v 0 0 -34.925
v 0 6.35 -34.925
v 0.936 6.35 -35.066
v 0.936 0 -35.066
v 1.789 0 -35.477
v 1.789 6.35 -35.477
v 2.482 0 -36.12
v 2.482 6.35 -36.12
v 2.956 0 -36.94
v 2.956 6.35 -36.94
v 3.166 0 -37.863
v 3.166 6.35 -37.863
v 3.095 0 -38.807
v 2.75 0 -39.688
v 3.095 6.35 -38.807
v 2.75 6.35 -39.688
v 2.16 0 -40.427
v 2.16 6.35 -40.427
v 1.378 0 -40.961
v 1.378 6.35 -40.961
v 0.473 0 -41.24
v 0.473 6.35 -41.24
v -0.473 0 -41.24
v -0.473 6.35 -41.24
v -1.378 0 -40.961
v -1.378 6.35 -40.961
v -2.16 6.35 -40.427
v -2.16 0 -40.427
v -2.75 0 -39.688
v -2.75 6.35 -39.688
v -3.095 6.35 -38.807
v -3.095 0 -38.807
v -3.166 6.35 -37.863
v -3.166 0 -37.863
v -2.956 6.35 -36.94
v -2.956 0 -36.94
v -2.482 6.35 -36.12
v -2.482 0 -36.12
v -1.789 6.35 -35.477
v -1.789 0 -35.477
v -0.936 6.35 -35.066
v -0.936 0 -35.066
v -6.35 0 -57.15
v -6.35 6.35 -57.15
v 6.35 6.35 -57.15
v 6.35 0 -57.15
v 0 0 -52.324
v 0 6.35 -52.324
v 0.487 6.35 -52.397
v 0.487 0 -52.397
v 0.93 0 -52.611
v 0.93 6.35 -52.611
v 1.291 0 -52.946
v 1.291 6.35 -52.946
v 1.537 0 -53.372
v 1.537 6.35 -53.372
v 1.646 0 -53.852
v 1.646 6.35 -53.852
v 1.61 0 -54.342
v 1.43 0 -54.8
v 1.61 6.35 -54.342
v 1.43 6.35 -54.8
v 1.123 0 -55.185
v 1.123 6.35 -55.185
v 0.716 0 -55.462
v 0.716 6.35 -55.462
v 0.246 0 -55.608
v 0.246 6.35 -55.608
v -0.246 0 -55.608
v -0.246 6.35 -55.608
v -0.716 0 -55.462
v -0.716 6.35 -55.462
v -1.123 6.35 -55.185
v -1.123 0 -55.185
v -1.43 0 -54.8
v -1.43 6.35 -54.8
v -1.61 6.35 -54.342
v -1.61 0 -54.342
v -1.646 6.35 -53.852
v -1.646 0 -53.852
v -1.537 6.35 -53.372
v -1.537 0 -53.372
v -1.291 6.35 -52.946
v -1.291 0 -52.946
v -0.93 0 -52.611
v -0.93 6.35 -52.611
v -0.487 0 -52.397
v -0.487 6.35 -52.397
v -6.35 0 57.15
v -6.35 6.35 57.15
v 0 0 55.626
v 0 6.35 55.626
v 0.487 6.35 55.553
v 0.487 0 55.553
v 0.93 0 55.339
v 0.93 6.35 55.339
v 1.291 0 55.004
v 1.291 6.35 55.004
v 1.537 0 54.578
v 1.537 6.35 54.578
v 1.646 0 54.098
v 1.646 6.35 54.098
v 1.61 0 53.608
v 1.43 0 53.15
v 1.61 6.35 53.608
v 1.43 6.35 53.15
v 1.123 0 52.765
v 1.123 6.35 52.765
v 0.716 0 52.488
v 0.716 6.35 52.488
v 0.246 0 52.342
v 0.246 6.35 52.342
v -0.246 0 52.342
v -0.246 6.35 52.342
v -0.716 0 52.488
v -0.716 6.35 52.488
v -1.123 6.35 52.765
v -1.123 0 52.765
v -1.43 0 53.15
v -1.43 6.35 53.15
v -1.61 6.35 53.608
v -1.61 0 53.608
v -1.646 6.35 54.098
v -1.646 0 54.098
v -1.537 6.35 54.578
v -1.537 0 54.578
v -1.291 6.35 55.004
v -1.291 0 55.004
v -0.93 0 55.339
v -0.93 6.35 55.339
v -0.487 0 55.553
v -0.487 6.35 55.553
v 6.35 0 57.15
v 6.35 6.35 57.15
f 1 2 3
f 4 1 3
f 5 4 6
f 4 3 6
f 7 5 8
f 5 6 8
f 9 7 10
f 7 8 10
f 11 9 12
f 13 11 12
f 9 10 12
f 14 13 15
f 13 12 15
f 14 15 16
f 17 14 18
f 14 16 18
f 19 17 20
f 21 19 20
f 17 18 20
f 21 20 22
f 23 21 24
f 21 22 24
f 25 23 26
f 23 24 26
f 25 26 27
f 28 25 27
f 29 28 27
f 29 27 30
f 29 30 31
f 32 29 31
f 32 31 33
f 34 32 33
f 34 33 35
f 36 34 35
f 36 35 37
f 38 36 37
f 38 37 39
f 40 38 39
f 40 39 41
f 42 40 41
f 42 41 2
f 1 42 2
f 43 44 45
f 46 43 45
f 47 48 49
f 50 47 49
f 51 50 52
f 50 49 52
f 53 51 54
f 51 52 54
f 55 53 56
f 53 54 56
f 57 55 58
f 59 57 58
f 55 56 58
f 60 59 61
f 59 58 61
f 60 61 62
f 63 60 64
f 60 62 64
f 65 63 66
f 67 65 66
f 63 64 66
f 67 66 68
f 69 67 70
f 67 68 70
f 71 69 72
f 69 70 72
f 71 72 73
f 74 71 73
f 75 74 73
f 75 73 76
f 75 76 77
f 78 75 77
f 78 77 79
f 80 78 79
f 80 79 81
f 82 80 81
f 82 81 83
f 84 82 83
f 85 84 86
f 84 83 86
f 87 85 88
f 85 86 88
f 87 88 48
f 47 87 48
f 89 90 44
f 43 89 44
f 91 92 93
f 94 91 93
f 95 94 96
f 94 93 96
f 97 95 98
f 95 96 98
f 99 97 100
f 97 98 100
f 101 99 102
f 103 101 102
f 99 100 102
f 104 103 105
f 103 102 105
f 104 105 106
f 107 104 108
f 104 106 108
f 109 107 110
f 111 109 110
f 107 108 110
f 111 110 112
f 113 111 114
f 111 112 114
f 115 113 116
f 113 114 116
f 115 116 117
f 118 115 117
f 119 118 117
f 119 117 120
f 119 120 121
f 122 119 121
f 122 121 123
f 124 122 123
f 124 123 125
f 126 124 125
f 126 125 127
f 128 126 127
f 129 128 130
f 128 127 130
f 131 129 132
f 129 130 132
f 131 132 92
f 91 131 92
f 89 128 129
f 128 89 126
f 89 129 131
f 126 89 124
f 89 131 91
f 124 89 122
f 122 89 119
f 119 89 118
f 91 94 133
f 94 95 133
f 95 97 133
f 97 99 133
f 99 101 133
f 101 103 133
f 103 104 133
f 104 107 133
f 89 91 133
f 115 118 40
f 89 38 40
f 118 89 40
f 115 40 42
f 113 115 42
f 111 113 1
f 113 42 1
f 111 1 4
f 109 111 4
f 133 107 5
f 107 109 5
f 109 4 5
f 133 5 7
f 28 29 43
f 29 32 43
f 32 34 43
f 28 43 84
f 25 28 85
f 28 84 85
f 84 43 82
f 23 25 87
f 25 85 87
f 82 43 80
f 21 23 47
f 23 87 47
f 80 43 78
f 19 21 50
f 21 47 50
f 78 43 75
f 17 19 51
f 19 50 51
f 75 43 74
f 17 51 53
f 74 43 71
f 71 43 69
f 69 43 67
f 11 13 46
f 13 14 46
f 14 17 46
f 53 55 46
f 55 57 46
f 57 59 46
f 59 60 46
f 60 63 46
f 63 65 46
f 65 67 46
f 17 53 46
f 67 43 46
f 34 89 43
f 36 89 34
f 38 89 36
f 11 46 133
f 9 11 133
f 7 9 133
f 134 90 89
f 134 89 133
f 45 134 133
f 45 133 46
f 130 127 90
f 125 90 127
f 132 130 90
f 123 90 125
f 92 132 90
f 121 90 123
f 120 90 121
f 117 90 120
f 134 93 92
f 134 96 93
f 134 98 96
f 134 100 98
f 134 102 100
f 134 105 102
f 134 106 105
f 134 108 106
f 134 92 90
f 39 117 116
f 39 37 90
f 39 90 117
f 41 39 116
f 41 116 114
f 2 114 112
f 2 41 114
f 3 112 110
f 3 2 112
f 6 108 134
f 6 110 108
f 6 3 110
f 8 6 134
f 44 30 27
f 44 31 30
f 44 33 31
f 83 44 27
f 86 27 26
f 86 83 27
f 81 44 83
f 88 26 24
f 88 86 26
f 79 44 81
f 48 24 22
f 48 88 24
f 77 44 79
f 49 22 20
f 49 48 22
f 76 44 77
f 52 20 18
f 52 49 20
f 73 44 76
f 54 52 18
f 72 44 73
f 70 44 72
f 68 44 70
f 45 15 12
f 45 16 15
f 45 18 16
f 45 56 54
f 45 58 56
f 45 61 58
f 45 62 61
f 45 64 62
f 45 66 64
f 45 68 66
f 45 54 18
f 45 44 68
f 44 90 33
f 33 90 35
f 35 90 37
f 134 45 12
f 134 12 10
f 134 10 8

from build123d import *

# Parameters (mm, degrees)
SKETCH1_W           = 12.7
SKETCH1_H           = 101.6
BOSS_EXTRUDE1_DEPTH = 6.35
SKETCH2_W           = 12.7
SKETCH2_H           = 6.35
SKETCH2_R           = 1.651
BOSS_EXTRUDE2_DEPTH = 6.35
SKETCH3_R           = 3.175
CUT_EXTRUDE1_DEPTH  = 58.851253228


with BuildPart() as part:
    # Sketch1 → Boss-Extrude1 (new body)
    with BuildSketch(Plane(origin=(0, 0, 0), x_dir=(1, 0, 0), z_dir=(0, 1, 0))):
        Rectangle(SKETCH1_W, SKETCH1_H)
    extrude(amount=BOSS_EXTRUDE1_DEPTH)

    # Sketch2 → Boss-Extrude2 (add)
    # profile 1 of 2: a face of its own
    with BuildSketch(Plane(origin=(0, 6.35, 0), x_dir=(1, 0, 0), z_dir=(0, 1, 0))):
        with Locations((0, 53.975)):
            Rectangle(SKETCH2_W, SKETCH2_H)
        with Locations(Location((0, 53.975, 0), (0, 0, 270))):
            Circle(SKETCH2_R, mode=Mode.SUBTRACT)
    # profile 2 of 2: a face of its own
    with BuildSketch(Plane(origin=(0, 6.35, 0), x_dir=(1, 0, 0), z_dir=(0, 1, 0))):
        with Locations((0, -53.975)):
            Rectangle(SKETCH2_W, SKETCH2_H)
        with Locations(Location((0, -53.975, 0), (0, 0, 270))):
            Circle(SKETCH2_R, mode=Mode.SUBTRACT)
    extrude(amount=-BOSS_EXTRUDE2_DEPTH)

    # Sketch3 → Cut-Extrude1 (cut, through all)
    with BuildSketch(Plane(origin=(0, 6.35, 0), x_dir=(1, 0, 0), z_dir=(0, 1, 0))):
        with Locations(Location((0, 38.1, 0), (0, 0, 270))):
            Circle(SKETCH3_R)
    extrude(amount=-CUT_EXTRUDE1_DEPTH, mode=Mode.SUBTRACT)


solid = part.part
